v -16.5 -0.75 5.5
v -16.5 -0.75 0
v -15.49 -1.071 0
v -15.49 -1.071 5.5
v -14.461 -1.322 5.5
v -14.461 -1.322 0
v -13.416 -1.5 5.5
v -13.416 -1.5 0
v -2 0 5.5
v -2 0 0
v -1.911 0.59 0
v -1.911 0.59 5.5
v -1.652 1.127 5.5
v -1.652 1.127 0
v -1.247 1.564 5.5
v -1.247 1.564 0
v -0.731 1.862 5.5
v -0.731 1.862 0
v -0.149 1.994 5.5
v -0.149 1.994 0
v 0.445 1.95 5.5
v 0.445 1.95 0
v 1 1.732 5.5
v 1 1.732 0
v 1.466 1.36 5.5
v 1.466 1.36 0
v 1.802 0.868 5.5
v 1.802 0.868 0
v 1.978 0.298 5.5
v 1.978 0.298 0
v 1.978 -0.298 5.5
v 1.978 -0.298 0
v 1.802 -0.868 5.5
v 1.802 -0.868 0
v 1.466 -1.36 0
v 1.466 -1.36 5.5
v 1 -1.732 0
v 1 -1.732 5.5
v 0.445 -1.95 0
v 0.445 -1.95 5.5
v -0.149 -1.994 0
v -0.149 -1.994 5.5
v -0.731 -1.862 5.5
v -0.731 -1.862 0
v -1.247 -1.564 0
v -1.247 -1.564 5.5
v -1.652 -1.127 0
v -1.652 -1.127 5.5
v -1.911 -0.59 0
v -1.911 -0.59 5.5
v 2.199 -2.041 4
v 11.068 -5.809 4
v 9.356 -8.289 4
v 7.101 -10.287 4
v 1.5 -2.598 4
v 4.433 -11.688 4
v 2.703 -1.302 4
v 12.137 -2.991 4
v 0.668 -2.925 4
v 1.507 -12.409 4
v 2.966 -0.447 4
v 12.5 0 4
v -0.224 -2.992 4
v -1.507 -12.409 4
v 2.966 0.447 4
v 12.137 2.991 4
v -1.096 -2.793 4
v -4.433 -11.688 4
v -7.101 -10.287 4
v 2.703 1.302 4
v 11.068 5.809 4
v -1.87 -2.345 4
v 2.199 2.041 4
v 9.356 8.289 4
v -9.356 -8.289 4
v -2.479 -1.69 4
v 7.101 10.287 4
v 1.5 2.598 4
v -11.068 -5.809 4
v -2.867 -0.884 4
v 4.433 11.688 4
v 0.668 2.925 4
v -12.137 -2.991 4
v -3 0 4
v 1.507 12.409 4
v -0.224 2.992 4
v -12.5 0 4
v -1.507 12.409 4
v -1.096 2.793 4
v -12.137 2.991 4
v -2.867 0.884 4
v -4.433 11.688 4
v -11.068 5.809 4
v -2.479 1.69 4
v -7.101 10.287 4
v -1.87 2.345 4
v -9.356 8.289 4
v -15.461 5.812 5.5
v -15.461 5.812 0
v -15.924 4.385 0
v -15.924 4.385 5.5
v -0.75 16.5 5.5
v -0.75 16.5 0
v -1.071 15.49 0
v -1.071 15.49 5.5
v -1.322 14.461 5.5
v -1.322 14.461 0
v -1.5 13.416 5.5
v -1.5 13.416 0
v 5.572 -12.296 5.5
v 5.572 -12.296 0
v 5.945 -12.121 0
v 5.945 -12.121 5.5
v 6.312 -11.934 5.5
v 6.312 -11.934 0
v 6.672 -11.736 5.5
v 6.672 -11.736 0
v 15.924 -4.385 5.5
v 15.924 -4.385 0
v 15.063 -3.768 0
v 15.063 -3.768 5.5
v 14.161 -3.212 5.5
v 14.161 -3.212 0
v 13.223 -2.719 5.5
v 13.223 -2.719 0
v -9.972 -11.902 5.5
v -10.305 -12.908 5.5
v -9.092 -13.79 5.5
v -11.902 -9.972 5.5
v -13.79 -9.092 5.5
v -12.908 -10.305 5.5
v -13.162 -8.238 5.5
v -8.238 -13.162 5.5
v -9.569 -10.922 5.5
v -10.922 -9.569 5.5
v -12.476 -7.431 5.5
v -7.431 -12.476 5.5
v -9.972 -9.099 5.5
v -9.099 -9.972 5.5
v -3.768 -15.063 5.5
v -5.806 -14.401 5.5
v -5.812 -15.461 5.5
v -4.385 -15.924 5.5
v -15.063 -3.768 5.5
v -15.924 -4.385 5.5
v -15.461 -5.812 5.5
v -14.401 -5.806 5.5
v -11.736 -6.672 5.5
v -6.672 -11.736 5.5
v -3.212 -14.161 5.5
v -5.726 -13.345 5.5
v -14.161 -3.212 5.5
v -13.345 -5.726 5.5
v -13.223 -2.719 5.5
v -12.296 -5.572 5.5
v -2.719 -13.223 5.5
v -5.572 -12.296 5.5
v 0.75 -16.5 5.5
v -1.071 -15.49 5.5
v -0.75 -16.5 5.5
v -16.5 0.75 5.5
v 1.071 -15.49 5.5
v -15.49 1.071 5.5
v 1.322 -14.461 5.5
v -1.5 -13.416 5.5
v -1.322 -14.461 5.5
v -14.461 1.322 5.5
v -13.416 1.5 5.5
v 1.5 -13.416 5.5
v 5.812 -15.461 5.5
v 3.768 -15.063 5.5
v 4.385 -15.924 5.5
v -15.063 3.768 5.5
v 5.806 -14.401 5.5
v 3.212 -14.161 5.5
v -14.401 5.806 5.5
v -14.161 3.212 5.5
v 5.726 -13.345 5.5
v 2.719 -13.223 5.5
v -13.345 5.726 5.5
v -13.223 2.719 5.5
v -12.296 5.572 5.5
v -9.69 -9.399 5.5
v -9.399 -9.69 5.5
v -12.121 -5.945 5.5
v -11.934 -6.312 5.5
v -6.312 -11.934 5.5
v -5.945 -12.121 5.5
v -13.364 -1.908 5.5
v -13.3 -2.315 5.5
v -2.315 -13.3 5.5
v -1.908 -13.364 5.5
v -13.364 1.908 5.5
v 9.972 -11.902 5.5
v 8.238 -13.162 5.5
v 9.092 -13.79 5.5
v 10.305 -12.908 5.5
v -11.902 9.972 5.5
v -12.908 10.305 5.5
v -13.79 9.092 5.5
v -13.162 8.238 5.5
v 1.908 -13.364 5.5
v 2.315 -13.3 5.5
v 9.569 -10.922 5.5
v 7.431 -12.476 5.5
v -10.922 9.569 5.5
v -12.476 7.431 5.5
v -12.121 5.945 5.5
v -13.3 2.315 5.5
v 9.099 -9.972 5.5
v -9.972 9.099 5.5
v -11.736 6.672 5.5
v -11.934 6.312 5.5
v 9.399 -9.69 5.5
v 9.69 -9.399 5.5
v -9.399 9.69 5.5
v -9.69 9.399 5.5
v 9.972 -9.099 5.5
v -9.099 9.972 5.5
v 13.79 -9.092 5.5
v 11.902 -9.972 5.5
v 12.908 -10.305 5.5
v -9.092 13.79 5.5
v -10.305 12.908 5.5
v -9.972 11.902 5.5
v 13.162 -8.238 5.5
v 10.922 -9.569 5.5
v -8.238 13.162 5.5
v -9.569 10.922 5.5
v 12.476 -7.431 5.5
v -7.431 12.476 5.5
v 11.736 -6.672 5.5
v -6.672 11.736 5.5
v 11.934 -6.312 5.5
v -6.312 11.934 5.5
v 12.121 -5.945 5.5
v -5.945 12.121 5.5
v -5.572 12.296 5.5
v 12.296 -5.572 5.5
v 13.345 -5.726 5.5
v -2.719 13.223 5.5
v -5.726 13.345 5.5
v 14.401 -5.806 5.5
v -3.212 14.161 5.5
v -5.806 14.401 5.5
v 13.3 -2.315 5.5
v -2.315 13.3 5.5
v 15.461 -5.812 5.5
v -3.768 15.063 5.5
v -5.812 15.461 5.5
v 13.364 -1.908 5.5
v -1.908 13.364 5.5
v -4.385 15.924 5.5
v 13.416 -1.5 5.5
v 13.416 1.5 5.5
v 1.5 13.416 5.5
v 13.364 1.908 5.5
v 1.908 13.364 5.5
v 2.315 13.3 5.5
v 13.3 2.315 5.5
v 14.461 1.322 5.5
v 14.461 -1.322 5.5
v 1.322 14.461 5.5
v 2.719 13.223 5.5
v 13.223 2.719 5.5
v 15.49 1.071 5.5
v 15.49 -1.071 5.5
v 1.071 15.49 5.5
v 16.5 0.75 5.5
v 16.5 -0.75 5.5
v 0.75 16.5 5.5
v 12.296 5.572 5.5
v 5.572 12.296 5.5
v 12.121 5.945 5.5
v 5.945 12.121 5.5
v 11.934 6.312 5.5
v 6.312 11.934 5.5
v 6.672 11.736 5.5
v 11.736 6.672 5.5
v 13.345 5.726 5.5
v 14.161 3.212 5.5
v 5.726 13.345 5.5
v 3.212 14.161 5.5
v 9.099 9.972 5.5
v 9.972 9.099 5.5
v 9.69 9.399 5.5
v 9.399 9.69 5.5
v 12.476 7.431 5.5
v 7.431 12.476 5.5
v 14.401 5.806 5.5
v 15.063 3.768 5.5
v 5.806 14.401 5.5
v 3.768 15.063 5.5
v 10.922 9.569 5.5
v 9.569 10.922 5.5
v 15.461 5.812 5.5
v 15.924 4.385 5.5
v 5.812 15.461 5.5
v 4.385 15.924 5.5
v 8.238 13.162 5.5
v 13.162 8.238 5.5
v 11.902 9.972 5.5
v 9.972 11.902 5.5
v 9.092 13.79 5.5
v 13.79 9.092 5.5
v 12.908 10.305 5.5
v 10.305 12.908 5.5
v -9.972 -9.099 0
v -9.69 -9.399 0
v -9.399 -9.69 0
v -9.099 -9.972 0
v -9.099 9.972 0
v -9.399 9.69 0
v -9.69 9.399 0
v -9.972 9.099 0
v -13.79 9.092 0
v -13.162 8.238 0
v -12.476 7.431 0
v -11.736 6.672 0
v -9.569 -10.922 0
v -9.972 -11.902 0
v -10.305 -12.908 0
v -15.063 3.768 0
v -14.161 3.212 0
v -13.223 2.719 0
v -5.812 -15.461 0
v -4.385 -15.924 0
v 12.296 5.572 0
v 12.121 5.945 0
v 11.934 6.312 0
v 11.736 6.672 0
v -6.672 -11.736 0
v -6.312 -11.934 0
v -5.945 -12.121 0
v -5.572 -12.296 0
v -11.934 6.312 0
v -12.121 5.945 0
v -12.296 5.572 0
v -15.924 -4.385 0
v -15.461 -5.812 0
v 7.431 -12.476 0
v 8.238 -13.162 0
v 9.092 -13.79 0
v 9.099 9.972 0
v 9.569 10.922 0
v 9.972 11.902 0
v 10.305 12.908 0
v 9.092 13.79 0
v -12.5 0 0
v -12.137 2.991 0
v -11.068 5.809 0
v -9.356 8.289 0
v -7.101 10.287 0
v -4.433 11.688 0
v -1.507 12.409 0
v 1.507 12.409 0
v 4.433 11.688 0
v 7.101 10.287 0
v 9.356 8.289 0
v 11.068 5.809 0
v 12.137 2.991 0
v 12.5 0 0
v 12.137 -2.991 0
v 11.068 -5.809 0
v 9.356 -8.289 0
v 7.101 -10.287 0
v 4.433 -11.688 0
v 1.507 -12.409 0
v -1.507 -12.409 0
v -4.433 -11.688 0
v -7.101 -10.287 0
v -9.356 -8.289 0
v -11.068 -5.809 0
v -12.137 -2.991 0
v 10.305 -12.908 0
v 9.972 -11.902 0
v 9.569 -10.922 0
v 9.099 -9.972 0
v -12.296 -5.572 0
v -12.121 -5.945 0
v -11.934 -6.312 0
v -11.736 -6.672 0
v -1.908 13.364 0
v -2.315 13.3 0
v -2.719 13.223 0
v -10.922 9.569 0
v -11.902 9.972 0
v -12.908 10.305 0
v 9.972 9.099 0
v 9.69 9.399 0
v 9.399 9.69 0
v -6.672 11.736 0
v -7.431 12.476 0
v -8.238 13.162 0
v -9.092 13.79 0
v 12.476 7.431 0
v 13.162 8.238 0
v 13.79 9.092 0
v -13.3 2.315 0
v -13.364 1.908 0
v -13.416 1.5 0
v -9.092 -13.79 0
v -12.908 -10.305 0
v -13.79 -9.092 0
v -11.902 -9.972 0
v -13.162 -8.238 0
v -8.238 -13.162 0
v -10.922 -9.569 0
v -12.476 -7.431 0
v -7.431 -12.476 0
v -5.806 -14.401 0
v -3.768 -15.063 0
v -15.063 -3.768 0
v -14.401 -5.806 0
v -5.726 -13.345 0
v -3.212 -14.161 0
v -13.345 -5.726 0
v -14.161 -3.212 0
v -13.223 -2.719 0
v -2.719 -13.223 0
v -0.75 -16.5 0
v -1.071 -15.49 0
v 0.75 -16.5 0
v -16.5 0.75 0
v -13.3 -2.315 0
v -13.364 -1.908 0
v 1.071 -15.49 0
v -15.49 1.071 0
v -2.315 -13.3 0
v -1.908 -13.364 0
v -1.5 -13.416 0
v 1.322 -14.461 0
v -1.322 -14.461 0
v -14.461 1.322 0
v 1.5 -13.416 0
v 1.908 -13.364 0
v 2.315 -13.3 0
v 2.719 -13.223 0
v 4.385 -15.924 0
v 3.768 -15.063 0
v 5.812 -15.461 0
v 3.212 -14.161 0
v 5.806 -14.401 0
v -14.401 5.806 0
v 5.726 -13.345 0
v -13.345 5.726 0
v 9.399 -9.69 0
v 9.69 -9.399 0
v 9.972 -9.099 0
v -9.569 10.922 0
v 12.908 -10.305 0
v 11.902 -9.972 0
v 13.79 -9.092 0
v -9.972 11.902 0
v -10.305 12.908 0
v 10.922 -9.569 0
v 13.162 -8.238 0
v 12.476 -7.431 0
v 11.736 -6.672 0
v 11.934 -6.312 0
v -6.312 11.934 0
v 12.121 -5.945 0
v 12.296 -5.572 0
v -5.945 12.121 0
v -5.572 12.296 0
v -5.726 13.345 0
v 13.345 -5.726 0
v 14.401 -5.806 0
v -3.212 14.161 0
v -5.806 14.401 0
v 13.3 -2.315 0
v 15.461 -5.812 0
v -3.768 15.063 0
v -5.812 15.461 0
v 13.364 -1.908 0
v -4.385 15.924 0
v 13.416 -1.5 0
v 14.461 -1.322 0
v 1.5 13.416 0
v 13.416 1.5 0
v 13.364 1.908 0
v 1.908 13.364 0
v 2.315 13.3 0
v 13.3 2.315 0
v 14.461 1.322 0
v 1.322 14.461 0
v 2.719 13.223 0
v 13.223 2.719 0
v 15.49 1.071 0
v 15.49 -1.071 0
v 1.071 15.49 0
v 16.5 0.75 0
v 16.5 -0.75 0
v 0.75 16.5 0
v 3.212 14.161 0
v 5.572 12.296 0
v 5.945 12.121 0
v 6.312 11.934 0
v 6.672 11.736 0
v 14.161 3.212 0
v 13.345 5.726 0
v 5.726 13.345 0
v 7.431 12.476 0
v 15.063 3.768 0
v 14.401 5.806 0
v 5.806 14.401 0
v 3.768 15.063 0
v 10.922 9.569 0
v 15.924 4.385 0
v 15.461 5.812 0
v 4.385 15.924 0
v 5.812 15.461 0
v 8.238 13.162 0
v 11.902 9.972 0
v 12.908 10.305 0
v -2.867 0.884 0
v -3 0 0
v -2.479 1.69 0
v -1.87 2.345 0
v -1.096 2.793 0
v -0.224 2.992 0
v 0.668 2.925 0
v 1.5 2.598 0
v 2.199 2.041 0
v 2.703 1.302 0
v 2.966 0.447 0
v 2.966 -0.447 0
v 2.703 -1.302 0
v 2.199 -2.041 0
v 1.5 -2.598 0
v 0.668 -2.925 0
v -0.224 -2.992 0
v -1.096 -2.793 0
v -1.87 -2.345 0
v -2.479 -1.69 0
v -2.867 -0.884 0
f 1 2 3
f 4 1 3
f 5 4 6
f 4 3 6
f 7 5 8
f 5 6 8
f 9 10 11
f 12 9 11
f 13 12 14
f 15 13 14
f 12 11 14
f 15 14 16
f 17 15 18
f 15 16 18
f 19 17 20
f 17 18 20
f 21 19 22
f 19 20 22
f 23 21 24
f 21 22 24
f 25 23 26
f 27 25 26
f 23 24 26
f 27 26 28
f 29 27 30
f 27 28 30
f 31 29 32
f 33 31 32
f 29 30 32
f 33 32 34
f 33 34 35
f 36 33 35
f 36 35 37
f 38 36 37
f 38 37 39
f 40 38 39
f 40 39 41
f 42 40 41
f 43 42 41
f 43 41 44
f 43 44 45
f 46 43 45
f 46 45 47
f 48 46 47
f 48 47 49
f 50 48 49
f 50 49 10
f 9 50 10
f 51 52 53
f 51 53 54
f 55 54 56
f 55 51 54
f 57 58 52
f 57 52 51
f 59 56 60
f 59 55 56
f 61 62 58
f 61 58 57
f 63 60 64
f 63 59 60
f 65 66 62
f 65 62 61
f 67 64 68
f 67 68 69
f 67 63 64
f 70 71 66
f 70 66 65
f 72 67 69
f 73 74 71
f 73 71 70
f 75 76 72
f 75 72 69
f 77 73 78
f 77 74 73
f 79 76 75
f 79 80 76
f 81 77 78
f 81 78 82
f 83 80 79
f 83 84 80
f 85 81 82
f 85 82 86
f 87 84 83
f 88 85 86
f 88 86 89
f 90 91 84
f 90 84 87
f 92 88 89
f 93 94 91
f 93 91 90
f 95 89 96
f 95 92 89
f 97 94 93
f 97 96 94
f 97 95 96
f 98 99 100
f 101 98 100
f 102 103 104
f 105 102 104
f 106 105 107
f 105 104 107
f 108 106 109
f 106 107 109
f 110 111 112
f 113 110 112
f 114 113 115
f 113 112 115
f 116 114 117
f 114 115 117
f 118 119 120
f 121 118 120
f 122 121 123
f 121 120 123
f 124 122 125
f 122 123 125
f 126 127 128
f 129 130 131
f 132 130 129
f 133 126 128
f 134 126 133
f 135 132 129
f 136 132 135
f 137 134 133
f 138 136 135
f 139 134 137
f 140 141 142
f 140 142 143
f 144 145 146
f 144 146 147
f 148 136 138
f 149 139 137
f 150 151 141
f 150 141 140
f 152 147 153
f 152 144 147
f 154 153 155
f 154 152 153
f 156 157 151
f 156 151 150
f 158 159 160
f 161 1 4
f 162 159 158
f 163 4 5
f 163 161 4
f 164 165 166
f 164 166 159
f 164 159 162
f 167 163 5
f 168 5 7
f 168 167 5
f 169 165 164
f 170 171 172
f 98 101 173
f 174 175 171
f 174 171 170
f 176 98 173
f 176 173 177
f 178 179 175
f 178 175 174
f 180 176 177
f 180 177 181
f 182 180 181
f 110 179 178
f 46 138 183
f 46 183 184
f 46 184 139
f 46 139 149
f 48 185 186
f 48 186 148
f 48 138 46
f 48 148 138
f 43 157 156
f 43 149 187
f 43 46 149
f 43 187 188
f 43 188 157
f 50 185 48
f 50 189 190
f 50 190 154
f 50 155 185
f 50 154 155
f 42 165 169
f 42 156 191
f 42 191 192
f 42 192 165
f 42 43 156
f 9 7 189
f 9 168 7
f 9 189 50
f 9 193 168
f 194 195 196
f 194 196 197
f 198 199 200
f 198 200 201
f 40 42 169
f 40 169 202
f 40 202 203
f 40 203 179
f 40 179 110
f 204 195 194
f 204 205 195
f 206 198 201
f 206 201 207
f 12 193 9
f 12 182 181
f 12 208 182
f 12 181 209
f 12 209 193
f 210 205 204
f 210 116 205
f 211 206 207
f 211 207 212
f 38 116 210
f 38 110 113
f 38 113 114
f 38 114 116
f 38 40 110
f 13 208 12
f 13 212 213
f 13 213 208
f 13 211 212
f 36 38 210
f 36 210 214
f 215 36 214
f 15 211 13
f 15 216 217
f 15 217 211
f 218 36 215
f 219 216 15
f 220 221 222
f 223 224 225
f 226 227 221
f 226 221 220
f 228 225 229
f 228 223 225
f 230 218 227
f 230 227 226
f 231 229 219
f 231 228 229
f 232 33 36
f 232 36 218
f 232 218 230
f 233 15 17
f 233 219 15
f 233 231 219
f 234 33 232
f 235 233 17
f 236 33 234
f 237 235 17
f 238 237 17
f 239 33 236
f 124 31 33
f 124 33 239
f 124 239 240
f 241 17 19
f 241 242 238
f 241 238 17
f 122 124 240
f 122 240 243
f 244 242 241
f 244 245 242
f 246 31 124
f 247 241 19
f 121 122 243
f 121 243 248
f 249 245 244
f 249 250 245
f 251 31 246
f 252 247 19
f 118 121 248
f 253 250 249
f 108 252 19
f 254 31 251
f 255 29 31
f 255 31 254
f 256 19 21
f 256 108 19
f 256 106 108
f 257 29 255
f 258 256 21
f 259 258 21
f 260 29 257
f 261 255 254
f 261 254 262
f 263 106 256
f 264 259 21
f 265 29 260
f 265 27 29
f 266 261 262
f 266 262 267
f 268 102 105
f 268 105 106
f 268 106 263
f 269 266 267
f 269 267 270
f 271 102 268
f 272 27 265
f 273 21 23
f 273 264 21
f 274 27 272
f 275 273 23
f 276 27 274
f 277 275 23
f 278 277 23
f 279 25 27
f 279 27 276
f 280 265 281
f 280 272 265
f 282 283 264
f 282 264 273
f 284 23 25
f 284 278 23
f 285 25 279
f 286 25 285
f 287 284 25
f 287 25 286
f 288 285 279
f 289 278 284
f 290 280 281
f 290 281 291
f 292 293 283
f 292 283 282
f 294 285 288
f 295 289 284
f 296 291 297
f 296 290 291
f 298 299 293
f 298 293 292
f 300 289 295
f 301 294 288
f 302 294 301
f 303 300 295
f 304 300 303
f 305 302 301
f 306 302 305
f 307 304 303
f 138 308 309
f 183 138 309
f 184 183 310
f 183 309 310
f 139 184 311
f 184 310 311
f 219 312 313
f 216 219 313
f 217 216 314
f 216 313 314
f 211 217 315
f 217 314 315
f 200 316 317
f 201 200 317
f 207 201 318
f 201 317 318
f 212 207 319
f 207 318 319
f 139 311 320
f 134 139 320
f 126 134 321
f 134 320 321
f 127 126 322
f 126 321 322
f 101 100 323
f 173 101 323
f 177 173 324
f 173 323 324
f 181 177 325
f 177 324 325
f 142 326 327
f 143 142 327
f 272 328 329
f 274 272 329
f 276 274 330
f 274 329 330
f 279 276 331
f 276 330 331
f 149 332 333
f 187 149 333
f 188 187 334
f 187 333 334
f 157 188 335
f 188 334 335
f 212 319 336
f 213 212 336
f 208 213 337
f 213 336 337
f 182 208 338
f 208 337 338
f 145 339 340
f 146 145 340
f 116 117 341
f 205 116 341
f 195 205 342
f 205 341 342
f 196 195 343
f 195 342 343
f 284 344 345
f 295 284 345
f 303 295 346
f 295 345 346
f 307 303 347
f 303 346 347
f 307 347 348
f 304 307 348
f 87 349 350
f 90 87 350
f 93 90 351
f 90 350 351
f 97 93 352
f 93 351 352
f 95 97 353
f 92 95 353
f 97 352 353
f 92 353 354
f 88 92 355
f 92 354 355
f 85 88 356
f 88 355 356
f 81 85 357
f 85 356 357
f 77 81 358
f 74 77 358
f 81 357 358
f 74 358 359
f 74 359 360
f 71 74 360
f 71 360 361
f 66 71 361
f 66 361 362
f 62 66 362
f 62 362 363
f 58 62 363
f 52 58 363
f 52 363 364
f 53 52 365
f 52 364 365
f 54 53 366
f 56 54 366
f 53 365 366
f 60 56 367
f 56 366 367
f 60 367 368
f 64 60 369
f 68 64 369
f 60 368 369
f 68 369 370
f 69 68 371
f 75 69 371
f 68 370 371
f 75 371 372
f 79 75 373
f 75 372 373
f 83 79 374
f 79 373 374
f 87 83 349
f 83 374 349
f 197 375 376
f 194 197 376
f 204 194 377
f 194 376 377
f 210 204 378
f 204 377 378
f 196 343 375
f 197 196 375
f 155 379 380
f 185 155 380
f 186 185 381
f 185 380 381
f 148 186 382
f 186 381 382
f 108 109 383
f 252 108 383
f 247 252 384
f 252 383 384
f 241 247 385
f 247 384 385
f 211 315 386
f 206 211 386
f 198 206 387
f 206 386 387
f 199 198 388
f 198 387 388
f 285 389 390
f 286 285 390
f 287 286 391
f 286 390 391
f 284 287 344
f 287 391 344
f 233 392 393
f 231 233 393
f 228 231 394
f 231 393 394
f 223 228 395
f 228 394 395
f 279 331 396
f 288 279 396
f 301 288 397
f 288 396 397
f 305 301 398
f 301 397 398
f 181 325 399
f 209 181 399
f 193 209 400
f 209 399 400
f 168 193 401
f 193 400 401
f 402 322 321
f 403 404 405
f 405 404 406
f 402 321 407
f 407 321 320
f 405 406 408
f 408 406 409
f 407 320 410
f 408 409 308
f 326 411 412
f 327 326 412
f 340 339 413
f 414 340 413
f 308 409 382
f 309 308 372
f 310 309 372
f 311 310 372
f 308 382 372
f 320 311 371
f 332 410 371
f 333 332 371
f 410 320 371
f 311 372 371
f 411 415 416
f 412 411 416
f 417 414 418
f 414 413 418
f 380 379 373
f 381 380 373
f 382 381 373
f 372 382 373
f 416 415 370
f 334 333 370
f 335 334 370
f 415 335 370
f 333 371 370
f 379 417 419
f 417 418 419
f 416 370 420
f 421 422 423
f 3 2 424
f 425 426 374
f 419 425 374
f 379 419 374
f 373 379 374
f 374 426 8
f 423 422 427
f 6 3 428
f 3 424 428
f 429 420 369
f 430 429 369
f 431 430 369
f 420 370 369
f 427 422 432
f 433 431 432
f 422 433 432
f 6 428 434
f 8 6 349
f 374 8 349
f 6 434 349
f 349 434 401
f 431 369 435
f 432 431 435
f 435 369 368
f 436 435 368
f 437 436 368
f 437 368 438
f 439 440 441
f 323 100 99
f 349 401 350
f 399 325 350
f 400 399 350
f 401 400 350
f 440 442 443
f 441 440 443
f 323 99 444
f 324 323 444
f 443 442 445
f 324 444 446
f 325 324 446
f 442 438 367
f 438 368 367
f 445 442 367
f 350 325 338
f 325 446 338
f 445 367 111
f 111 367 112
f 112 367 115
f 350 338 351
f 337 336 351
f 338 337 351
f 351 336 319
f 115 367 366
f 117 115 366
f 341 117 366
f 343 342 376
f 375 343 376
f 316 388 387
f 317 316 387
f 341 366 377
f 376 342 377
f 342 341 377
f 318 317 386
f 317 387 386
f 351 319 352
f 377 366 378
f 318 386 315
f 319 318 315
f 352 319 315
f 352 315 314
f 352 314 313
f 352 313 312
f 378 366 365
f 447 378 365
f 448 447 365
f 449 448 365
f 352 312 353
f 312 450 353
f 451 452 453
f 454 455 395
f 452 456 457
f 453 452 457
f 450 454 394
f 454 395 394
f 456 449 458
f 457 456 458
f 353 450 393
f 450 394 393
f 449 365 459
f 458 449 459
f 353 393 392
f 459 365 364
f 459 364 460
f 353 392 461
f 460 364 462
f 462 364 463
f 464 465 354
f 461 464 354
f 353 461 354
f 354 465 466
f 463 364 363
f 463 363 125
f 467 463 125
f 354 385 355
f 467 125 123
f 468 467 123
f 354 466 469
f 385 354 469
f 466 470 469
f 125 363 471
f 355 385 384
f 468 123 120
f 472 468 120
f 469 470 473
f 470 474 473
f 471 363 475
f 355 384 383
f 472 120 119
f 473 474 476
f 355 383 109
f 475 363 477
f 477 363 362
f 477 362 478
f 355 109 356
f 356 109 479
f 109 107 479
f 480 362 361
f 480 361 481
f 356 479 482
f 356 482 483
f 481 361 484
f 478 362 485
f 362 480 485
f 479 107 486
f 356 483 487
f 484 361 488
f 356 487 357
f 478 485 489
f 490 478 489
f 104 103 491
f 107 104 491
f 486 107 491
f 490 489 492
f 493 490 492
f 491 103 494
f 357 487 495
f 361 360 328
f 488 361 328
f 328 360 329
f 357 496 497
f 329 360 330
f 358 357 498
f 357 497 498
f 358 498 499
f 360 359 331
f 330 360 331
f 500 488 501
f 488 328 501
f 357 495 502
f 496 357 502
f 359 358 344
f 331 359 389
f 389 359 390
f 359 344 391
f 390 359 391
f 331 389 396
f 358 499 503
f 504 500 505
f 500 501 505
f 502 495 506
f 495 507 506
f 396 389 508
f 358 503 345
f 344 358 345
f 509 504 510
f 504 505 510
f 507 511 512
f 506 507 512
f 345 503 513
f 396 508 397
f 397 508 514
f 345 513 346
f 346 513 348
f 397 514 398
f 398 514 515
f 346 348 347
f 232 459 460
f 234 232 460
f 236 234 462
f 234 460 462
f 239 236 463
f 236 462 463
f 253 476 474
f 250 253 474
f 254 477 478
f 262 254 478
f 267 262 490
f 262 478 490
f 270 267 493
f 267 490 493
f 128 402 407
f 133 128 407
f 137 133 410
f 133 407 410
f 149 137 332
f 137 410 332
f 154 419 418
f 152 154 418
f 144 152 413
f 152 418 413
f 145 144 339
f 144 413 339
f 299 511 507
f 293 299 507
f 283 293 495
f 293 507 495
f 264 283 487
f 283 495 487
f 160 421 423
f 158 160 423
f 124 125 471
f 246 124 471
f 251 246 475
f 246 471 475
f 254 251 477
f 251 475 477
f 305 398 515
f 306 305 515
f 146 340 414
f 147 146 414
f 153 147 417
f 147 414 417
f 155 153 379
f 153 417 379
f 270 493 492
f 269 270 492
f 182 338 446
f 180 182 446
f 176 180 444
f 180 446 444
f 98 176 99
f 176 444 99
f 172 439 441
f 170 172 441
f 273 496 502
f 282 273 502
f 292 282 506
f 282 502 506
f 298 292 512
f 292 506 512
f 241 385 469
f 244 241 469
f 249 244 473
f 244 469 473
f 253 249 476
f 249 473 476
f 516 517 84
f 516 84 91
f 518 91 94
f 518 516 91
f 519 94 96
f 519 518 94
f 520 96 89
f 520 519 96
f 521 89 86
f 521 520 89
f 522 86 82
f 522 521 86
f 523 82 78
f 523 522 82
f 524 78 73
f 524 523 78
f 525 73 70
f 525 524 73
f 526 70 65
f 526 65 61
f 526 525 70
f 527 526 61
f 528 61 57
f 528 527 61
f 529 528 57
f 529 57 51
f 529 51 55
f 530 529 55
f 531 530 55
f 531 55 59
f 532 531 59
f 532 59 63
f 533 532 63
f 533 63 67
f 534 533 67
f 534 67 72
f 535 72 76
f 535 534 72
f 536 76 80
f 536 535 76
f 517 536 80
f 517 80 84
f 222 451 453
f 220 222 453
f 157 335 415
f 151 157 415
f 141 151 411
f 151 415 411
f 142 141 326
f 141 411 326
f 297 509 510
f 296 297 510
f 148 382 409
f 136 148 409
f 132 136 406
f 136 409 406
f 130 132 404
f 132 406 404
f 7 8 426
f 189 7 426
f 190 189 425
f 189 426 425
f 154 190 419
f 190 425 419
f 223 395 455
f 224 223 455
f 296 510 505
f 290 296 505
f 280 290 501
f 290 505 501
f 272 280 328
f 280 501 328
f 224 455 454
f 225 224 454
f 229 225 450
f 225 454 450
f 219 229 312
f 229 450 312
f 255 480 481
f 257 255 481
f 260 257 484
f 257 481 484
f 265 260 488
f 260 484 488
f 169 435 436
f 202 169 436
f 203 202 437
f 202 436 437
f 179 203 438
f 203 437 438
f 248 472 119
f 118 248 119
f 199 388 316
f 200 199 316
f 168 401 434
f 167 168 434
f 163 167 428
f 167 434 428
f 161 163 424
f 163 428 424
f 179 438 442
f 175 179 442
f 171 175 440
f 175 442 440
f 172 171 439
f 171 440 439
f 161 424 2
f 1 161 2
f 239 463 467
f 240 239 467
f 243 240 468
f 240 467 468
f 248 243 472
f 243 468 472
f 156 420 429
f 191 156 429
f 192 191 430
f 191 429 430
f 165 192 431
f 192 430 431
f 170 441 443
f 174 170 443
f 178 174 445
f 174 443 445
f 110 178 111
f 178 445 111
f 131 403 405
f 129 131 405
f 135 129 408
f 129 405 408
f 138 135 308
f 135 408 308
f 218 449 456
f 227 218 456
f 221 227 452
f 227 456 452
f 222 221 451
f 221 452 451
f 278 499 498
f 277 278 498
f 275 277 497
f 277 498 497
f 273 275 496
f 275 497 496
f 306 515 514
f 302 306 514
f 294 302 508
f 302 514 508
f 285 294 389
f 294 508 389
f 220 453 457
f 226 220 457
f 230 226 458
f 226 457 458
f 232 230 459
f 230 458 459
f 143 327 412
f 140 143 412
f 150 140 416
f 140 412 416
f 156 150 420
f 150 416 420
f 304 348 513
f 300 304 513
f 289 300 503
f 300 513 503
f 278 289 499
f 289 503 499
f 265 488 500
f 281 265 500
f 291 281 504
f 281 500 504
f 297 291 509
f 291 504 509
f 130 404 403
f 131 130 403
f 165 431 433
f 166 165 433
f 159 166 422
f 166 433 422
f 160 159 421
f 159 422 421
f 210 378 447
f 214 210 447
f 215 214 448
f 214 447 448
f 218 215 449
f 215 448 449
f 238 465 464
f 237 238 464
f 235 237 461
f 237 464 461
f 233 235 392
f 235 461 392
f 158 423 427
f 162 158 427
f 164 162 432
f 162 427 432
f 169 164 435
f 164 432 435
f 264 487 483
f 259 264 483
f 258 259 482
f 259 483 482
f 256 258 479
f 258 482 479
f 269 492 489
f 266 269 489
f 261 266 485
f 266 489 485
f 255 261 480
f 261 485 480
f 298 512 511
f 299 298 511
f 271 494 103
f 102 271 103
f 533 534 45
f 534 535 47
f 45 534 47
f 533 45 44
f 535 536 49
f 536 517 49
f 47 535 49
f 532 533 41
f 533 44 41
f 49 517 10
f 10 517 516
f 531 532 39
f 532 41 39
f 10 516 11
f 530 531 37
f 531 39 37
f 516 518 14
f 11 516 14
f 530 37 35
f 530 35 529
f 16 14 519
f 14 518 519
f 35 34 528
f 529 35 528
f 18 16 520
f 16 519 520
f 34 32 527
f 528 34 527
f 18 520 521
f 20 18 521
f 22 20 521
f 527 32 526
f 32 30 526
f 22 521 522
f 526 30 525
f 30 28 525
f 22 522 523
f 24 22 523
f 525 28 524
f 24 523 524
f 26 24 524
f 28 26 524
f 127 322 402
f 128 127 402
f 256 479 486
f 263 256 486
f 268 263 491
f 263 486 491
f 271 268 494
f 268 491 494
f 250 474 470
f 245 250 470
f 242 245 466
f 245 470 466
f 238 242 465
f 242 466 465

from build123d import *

# Parameters (mm, degrees)
SKETCH_1_R          = 13.5
EXTRUDE_1_DEPTH     = 5.5
EXTRUDE_START       = -5.5
EXTRUDE_2_DEPTH     = 5.5
SKETCH_7_R          = 2
CUT_EXTRUDE_1_DEPTH = 24.973944189
SKETCH_8_R          = 12.5
SKETCH_8_R_2        = 3
CUT_EXTRUDE_2_DEPTH = 4


with BuildPart() as part:
    # 草图1 → 凸台-拉伸1 (new body)
    with BuildSketch(Plane.XY):
        Circle(SKETCH_1_R)
    extrude(amount=EXTRUDE_1_DEPTH)

    # 草图6 → 凸台-拉伸2 (add)
    with BuildSketch(Plane.XY.offset(5.5).offset(EXTRUDE_START)):
        with BuildLine():
            Line((5.812072794, 15.460669773), (4.38548802, 15.924195265))
            ThreePointArc((4.38548802, 15.924195265), (3.48195608, 14.617198294), (2.719313259, 13.223287617))
            ThreePointArc((2.719313259, 13.223287617), (4.171729424, 12.83926297), (5.572482808, 12.296236634))
            ThreePointArc((5.572482808, 12.296236634), (5.774811944, 13.872204263), (5.812072794, 15.460669773))
        make_face()
        with BuildLine():
            Line((10.305219409, 12.907941468), (9.091693917, 13.789619346))
            ThreePointArc((9.091693917, 13.789619346), (7.828499702, 12.825798085), (6.67244119, 11.735779845))
            ThreePointArc((6.67244119, 11.735779845), (7.935100906, 10.921729424), (9.099492173, 9.972424088))
            ThreePointArc((9.099492173, 9.972424088), (9.778919397, 11.40873523), (10.305219409, 12.907941468))
        make_face()
        with BuildLine():
            Line((0.75, 16.5), (-0.75, 16.5))
            ThreePointArc((-0.75, 16.5), (-1.205425663, 14.97776529), (-1.5, 13.416407865))
            ThreePointArc((-1.5, 13.416407865), (0, 13.5), (1.5, 13.416407865))
            ThreePointArc((1.5, 13.416407865), (1.205425663, 14.97776529), (0.75, 16.5))
        make_face()
        with BuildLine():
            Line((13.789619346, 9.091693917), (12.907941468, 10.305219409))
            ThreePointArc((12.907941468, 10.305219409), (11.40873523, 9.778919397), (9.972424088, 9.099492173))
            ThreePointArc((9.972424088, 9.099492173), (10.921729424, 7.935100906), (11.735779845, 6.67244119))
            ThreePointArc((11.735779845, 6.67244119), (12.825798085, 7.828499702), (13.789619346, 9.091693917))
        make_face()
        with BuildLine():
            Line((15.924195265, 4.38548802), (15.460669773, 5.812072794))
            ThreePointArc((15.460669773, 5.812072794), (13.872204263, 5.774811944), (12.296236634, 5.572482808))
            ThreePointArc((12.296236634, 5.572482808), (12.83926297, 4.171729424), (13.223287617, 2.719313259))
            ThreePointArc((13.223287617, 2.719313259), (14.617198294, 3.48195608), (15.924195265, 4.38548802))
        make_face()
        with BuildLine():
            Line((16.5, -0.75), (16.5, 0.75))
            ThreePointArc((16.5, 0.75), (14.97776529, 1.205425663), (13.416407865, 1.5))
            ThreePointArc((13.416407865, 1.5), (13.5, 0), (13.416407865, -1.5))
            ThreePointArc((13.416407865, -1.5), (14.97776529, -1.205425663), (16.5, -0.75))
        make_face()
        with BuildLine():
            Line((15.460669773, -5.812072794), (15.924195265, -4.38548802))
            ThreePointArc((15.924195265, -4.38548802), (14.617198294, -3.48195608), (13.223287617, -2.719313259))
            ThreePointArc((13.223287617, -2.719313259), (12.83926297, -4.171729424), (12.296236634, -5.572482808))
            ThreePointArc((12.296236634, -5.572482808), (13.872204263, -5.774811944), (15.460669773, -5.812072794))
        make_face()
        with BuildLine():
            Line((12.907941468, -10.305219409), (13.789619346, -9.091693917))
            ThreePointArc((13.789619346, -9.091693917), (12.825798085, -7.828499702), (11.735779845, -6.67244119))
            ThreePointArc((11.735779845, -6.67244119), (10.921729424, -7.935100906), (9.972424088, -9.099492173))
            ThreePointArc((9.972424088, -9.099492173), (11.40873523, -9.778919397), (12.907941468, -10.305219409))
        make_face()
        with BuildLine():
            Line((9.091693917, -13.789619346), (10.305219409, -12.907941468))
            ThreePointArc((10.305219409, -12.907941468), (9.778919397, -11.40873523), (9.099492173, -9.972424088))
            ThreePointArc((9.099492173, -9.972424088), (7.935100906, -10.921729424), (6.67244119, -11.735779845))
            ThreePointArc((6.67244119, -11.735779845), (7.828499702, -12.825798085), (9.091693917, -13.789619346))
        make_face()
        with BuildLine():
            Line((4.38548802, -15.924195265), (5.812072794, -15.460669773))
            ThreePointArc((5.812072794, -15.460669773), (5.774811944, -13.872204263), (5.572482808, -12.296236634))
            ThreePointArc((5.572482808, -12.296236634), (4.171729424, -12.83926297), (2.719313259, -13.223287617))
            ThreePointArc((2.719313259, -13.223287617), (3.48195608, -14.617198294), (4.38548802, -15.924195265))
        make_face()
        with BuildLine():
            Line((-0.75, -16.5), (0.75, -16.5))
            ThreePointArc((0.75, -16.5), (1.205425663, -14.97776529), (1.5, -13.416407865))
            ThreePointArc((1.5, -13.416407865), (0, -13.5), (-1.5, -13.416407865))
            ThreePointArc((-1.5, -13.416407865), (-1.205425663, -14.97776529), (-0.75, -16.5))
        make_face()
        with BuildLine():
            Line((-5.812072794, -15.460669773), (-4.38548802, -15.924195265))
            ThreePointArc((-4.38548802, -15.924195265), (-3.48195608, -14.617198294), (-2.719313259, -13.223287617))
            ThreePointArc((-2.719313259, -13.223287617), (-4.171729424, -12.83926297), (-5.572482808, -12.296236634))
            ThreePointArc((-5.572482808, -12.296236634), (-5.774811944, -13.872204263), (-5.812072794, -15.460669773))
        make_face()
        with BuildLine():
            Line((-10.305219409, -12.907941468), (-9.091693917, -13.789619346))
            ThreePointArc((-9.091693917, -13.789619346), (-7.828499702, -12.825798085), (-6.67244119, -11.735779845))
            ThreePointArc((-6.67244119, -11.735779845), (-7.935100906, -10.921729424), (-9.099492173, -9.972424088))
            ThreePointArc((-9.099492173, -9.972424088), (-9.778919397, -11.40873523), (-10.305219409, -12.907941468))
        make_face()
        with BuildLine():
            Line((-13.789619346, -9.091693917), (-12.907941468, -10.305219409))
            ThreePointArc((-12.907941468, -10.305219409), (-11.40873523, -9.778919397), (-9.972424088, -9.099492173))
            ThreePointArc((-9.972424088, -9.099492173), (-10.921729424, -7.935100906), (-11.735779845, -6.67244119))
            ThreePointArc((-11.735779845, -6.67244119), (-12.825798085, -7.828499702), (-13.789619346, -9.091693917))
        make_face()
        with BuildLine():
            Line((-15.924195265, -4.38548802), (-15.460669773, -5.812072794))
            ThreePointArc((-15.460669773, -5.812072794), (-13.872204263, -5.774811944), (-12.296236634, -5.572482808))
            ThreePointArc((-12.296236634, -5.572482808), (-12.83926297, -4.171729424), (-13.223287617, -2.719313259))
            ThreePointArc((-13.223287617, -2.719313259), (-14.617198294, -3.48195608), (-15.924195265, -4.38548802))
        make_face()
        with BuildLine():
            Line((-16.5, 0.75), (-16.5, -0.75))
            ThreePointArc((-16.5, -0.75), (-14.97776529, -1.205425663), (-13.416407865, -1.5))
            ThreePointArc((-13.416407865, -1.5), (-13.5, 0), (-13.416407865, 1.5))
            ThreePointArc((-13.416407865, 1.5), (-14.97776529, 1.205425663), (-16.5, 0.75))
        make_face()
        with BuildLine():
            Line((-15.460669773, 5.812072794), (-15.924195265, 4.38548802))
            ThreePointArc((-15.924195265, 4.38548802), (-14.617198294, 3.48195608), (-13.223287617, 2.719313259))
            ThreePointArc((-13.223287617, 2.719313259), (-12.83926297, 4.171729424), (-12.296236634, 5.572482808))
            ThreePointArc((-12.296236634, 5.572482808), (-13.872204263, 5.774811944), (-15.460669773, 5.812072794))
        make_face()
        with BuildLine():
            Line((-12.907941468, 10.305219409), (-13.789619346, 9.091693917))
            ThreePointArc((-13.789619346, 9.091693917), (-12.825798085, 7.828499702), (-11.735779845, 6.67244119))
            ThreePointArc((-11.735779845, 6.67244119), (-10.921729424, 7.935100906), (-9.972424088, 9.099492173))
            ThreePointArc((-9.972424088, 9.099492173), (-11.40873523, 9.778919397), (-12.907941468, 10.305219409))
        make_face()
        with BuildLine():
            Line((-9.091693917, 13.789619346), (-10.305219409, 12.907941468))
            ThreePointArc((-10.305219409, 12.907941468), (-9.778919397, 11.40873523), (-9.099492173, 9.972424088))
            ThreePointArc((-9.099492173, 9.972424088), (-7.935100906, 10.921729424), (-6.67244119, 11.735779845))
            ThreePointArc((-6.67244119, 11.735779845), (-7.828499702, 12.825798085), (-9.091693917, 13.789619346))
        make_face()
        with BuildLine():
            Line((-4.38548802, 15.924195265), (-5.812072794, 15.460669773))
            ThreePointArc((-5.812072794, 15.460669773), (-5.774811944, 13.872204263), (-5.572482808, 12.296236634))
            ThreePointArc((-5.572482808, 12.296236634), (-4.171729424, 12.83926297), (-2.719313259, 13.223287617))
            ThreePointArc((-2.719313259, 13.223287617), (-3.48195608, 14.617198294), (-4.38548802, 15.924195265))
        make_face()
    extrude(amount=EXTRUDE_2_DEPTH)

    # 草图7 → 切除-拉伸1 (cut, through all)
    with BuildSketch(Plane(origin=(0, 0, 0), x_dir=(-1, 0, 0), z_dir=(0, 0, -1))):
        Circle(SKETCH_7_R)
    extrude(amount=-CUT_EXTRUDE_1_DEPTH, mode=Mode.SUBTRACT)

    # 草图8 → 切除-拉伸2 (cut)
    with BuildSketch(Plane(origin=(0, 0, 0), x_dir=(-1, 0, 0), z_dir=(0, 0, -1))):
        Circle(SKETCH_8_R)
        Circle(SKETCH_8_R_2, mode=Mode.SUBTRACT)
    extrude(amount=-CUT_EXTRUDE_2_DEPTH, mode=Mode.SUBTRACT)


solid = part.part
